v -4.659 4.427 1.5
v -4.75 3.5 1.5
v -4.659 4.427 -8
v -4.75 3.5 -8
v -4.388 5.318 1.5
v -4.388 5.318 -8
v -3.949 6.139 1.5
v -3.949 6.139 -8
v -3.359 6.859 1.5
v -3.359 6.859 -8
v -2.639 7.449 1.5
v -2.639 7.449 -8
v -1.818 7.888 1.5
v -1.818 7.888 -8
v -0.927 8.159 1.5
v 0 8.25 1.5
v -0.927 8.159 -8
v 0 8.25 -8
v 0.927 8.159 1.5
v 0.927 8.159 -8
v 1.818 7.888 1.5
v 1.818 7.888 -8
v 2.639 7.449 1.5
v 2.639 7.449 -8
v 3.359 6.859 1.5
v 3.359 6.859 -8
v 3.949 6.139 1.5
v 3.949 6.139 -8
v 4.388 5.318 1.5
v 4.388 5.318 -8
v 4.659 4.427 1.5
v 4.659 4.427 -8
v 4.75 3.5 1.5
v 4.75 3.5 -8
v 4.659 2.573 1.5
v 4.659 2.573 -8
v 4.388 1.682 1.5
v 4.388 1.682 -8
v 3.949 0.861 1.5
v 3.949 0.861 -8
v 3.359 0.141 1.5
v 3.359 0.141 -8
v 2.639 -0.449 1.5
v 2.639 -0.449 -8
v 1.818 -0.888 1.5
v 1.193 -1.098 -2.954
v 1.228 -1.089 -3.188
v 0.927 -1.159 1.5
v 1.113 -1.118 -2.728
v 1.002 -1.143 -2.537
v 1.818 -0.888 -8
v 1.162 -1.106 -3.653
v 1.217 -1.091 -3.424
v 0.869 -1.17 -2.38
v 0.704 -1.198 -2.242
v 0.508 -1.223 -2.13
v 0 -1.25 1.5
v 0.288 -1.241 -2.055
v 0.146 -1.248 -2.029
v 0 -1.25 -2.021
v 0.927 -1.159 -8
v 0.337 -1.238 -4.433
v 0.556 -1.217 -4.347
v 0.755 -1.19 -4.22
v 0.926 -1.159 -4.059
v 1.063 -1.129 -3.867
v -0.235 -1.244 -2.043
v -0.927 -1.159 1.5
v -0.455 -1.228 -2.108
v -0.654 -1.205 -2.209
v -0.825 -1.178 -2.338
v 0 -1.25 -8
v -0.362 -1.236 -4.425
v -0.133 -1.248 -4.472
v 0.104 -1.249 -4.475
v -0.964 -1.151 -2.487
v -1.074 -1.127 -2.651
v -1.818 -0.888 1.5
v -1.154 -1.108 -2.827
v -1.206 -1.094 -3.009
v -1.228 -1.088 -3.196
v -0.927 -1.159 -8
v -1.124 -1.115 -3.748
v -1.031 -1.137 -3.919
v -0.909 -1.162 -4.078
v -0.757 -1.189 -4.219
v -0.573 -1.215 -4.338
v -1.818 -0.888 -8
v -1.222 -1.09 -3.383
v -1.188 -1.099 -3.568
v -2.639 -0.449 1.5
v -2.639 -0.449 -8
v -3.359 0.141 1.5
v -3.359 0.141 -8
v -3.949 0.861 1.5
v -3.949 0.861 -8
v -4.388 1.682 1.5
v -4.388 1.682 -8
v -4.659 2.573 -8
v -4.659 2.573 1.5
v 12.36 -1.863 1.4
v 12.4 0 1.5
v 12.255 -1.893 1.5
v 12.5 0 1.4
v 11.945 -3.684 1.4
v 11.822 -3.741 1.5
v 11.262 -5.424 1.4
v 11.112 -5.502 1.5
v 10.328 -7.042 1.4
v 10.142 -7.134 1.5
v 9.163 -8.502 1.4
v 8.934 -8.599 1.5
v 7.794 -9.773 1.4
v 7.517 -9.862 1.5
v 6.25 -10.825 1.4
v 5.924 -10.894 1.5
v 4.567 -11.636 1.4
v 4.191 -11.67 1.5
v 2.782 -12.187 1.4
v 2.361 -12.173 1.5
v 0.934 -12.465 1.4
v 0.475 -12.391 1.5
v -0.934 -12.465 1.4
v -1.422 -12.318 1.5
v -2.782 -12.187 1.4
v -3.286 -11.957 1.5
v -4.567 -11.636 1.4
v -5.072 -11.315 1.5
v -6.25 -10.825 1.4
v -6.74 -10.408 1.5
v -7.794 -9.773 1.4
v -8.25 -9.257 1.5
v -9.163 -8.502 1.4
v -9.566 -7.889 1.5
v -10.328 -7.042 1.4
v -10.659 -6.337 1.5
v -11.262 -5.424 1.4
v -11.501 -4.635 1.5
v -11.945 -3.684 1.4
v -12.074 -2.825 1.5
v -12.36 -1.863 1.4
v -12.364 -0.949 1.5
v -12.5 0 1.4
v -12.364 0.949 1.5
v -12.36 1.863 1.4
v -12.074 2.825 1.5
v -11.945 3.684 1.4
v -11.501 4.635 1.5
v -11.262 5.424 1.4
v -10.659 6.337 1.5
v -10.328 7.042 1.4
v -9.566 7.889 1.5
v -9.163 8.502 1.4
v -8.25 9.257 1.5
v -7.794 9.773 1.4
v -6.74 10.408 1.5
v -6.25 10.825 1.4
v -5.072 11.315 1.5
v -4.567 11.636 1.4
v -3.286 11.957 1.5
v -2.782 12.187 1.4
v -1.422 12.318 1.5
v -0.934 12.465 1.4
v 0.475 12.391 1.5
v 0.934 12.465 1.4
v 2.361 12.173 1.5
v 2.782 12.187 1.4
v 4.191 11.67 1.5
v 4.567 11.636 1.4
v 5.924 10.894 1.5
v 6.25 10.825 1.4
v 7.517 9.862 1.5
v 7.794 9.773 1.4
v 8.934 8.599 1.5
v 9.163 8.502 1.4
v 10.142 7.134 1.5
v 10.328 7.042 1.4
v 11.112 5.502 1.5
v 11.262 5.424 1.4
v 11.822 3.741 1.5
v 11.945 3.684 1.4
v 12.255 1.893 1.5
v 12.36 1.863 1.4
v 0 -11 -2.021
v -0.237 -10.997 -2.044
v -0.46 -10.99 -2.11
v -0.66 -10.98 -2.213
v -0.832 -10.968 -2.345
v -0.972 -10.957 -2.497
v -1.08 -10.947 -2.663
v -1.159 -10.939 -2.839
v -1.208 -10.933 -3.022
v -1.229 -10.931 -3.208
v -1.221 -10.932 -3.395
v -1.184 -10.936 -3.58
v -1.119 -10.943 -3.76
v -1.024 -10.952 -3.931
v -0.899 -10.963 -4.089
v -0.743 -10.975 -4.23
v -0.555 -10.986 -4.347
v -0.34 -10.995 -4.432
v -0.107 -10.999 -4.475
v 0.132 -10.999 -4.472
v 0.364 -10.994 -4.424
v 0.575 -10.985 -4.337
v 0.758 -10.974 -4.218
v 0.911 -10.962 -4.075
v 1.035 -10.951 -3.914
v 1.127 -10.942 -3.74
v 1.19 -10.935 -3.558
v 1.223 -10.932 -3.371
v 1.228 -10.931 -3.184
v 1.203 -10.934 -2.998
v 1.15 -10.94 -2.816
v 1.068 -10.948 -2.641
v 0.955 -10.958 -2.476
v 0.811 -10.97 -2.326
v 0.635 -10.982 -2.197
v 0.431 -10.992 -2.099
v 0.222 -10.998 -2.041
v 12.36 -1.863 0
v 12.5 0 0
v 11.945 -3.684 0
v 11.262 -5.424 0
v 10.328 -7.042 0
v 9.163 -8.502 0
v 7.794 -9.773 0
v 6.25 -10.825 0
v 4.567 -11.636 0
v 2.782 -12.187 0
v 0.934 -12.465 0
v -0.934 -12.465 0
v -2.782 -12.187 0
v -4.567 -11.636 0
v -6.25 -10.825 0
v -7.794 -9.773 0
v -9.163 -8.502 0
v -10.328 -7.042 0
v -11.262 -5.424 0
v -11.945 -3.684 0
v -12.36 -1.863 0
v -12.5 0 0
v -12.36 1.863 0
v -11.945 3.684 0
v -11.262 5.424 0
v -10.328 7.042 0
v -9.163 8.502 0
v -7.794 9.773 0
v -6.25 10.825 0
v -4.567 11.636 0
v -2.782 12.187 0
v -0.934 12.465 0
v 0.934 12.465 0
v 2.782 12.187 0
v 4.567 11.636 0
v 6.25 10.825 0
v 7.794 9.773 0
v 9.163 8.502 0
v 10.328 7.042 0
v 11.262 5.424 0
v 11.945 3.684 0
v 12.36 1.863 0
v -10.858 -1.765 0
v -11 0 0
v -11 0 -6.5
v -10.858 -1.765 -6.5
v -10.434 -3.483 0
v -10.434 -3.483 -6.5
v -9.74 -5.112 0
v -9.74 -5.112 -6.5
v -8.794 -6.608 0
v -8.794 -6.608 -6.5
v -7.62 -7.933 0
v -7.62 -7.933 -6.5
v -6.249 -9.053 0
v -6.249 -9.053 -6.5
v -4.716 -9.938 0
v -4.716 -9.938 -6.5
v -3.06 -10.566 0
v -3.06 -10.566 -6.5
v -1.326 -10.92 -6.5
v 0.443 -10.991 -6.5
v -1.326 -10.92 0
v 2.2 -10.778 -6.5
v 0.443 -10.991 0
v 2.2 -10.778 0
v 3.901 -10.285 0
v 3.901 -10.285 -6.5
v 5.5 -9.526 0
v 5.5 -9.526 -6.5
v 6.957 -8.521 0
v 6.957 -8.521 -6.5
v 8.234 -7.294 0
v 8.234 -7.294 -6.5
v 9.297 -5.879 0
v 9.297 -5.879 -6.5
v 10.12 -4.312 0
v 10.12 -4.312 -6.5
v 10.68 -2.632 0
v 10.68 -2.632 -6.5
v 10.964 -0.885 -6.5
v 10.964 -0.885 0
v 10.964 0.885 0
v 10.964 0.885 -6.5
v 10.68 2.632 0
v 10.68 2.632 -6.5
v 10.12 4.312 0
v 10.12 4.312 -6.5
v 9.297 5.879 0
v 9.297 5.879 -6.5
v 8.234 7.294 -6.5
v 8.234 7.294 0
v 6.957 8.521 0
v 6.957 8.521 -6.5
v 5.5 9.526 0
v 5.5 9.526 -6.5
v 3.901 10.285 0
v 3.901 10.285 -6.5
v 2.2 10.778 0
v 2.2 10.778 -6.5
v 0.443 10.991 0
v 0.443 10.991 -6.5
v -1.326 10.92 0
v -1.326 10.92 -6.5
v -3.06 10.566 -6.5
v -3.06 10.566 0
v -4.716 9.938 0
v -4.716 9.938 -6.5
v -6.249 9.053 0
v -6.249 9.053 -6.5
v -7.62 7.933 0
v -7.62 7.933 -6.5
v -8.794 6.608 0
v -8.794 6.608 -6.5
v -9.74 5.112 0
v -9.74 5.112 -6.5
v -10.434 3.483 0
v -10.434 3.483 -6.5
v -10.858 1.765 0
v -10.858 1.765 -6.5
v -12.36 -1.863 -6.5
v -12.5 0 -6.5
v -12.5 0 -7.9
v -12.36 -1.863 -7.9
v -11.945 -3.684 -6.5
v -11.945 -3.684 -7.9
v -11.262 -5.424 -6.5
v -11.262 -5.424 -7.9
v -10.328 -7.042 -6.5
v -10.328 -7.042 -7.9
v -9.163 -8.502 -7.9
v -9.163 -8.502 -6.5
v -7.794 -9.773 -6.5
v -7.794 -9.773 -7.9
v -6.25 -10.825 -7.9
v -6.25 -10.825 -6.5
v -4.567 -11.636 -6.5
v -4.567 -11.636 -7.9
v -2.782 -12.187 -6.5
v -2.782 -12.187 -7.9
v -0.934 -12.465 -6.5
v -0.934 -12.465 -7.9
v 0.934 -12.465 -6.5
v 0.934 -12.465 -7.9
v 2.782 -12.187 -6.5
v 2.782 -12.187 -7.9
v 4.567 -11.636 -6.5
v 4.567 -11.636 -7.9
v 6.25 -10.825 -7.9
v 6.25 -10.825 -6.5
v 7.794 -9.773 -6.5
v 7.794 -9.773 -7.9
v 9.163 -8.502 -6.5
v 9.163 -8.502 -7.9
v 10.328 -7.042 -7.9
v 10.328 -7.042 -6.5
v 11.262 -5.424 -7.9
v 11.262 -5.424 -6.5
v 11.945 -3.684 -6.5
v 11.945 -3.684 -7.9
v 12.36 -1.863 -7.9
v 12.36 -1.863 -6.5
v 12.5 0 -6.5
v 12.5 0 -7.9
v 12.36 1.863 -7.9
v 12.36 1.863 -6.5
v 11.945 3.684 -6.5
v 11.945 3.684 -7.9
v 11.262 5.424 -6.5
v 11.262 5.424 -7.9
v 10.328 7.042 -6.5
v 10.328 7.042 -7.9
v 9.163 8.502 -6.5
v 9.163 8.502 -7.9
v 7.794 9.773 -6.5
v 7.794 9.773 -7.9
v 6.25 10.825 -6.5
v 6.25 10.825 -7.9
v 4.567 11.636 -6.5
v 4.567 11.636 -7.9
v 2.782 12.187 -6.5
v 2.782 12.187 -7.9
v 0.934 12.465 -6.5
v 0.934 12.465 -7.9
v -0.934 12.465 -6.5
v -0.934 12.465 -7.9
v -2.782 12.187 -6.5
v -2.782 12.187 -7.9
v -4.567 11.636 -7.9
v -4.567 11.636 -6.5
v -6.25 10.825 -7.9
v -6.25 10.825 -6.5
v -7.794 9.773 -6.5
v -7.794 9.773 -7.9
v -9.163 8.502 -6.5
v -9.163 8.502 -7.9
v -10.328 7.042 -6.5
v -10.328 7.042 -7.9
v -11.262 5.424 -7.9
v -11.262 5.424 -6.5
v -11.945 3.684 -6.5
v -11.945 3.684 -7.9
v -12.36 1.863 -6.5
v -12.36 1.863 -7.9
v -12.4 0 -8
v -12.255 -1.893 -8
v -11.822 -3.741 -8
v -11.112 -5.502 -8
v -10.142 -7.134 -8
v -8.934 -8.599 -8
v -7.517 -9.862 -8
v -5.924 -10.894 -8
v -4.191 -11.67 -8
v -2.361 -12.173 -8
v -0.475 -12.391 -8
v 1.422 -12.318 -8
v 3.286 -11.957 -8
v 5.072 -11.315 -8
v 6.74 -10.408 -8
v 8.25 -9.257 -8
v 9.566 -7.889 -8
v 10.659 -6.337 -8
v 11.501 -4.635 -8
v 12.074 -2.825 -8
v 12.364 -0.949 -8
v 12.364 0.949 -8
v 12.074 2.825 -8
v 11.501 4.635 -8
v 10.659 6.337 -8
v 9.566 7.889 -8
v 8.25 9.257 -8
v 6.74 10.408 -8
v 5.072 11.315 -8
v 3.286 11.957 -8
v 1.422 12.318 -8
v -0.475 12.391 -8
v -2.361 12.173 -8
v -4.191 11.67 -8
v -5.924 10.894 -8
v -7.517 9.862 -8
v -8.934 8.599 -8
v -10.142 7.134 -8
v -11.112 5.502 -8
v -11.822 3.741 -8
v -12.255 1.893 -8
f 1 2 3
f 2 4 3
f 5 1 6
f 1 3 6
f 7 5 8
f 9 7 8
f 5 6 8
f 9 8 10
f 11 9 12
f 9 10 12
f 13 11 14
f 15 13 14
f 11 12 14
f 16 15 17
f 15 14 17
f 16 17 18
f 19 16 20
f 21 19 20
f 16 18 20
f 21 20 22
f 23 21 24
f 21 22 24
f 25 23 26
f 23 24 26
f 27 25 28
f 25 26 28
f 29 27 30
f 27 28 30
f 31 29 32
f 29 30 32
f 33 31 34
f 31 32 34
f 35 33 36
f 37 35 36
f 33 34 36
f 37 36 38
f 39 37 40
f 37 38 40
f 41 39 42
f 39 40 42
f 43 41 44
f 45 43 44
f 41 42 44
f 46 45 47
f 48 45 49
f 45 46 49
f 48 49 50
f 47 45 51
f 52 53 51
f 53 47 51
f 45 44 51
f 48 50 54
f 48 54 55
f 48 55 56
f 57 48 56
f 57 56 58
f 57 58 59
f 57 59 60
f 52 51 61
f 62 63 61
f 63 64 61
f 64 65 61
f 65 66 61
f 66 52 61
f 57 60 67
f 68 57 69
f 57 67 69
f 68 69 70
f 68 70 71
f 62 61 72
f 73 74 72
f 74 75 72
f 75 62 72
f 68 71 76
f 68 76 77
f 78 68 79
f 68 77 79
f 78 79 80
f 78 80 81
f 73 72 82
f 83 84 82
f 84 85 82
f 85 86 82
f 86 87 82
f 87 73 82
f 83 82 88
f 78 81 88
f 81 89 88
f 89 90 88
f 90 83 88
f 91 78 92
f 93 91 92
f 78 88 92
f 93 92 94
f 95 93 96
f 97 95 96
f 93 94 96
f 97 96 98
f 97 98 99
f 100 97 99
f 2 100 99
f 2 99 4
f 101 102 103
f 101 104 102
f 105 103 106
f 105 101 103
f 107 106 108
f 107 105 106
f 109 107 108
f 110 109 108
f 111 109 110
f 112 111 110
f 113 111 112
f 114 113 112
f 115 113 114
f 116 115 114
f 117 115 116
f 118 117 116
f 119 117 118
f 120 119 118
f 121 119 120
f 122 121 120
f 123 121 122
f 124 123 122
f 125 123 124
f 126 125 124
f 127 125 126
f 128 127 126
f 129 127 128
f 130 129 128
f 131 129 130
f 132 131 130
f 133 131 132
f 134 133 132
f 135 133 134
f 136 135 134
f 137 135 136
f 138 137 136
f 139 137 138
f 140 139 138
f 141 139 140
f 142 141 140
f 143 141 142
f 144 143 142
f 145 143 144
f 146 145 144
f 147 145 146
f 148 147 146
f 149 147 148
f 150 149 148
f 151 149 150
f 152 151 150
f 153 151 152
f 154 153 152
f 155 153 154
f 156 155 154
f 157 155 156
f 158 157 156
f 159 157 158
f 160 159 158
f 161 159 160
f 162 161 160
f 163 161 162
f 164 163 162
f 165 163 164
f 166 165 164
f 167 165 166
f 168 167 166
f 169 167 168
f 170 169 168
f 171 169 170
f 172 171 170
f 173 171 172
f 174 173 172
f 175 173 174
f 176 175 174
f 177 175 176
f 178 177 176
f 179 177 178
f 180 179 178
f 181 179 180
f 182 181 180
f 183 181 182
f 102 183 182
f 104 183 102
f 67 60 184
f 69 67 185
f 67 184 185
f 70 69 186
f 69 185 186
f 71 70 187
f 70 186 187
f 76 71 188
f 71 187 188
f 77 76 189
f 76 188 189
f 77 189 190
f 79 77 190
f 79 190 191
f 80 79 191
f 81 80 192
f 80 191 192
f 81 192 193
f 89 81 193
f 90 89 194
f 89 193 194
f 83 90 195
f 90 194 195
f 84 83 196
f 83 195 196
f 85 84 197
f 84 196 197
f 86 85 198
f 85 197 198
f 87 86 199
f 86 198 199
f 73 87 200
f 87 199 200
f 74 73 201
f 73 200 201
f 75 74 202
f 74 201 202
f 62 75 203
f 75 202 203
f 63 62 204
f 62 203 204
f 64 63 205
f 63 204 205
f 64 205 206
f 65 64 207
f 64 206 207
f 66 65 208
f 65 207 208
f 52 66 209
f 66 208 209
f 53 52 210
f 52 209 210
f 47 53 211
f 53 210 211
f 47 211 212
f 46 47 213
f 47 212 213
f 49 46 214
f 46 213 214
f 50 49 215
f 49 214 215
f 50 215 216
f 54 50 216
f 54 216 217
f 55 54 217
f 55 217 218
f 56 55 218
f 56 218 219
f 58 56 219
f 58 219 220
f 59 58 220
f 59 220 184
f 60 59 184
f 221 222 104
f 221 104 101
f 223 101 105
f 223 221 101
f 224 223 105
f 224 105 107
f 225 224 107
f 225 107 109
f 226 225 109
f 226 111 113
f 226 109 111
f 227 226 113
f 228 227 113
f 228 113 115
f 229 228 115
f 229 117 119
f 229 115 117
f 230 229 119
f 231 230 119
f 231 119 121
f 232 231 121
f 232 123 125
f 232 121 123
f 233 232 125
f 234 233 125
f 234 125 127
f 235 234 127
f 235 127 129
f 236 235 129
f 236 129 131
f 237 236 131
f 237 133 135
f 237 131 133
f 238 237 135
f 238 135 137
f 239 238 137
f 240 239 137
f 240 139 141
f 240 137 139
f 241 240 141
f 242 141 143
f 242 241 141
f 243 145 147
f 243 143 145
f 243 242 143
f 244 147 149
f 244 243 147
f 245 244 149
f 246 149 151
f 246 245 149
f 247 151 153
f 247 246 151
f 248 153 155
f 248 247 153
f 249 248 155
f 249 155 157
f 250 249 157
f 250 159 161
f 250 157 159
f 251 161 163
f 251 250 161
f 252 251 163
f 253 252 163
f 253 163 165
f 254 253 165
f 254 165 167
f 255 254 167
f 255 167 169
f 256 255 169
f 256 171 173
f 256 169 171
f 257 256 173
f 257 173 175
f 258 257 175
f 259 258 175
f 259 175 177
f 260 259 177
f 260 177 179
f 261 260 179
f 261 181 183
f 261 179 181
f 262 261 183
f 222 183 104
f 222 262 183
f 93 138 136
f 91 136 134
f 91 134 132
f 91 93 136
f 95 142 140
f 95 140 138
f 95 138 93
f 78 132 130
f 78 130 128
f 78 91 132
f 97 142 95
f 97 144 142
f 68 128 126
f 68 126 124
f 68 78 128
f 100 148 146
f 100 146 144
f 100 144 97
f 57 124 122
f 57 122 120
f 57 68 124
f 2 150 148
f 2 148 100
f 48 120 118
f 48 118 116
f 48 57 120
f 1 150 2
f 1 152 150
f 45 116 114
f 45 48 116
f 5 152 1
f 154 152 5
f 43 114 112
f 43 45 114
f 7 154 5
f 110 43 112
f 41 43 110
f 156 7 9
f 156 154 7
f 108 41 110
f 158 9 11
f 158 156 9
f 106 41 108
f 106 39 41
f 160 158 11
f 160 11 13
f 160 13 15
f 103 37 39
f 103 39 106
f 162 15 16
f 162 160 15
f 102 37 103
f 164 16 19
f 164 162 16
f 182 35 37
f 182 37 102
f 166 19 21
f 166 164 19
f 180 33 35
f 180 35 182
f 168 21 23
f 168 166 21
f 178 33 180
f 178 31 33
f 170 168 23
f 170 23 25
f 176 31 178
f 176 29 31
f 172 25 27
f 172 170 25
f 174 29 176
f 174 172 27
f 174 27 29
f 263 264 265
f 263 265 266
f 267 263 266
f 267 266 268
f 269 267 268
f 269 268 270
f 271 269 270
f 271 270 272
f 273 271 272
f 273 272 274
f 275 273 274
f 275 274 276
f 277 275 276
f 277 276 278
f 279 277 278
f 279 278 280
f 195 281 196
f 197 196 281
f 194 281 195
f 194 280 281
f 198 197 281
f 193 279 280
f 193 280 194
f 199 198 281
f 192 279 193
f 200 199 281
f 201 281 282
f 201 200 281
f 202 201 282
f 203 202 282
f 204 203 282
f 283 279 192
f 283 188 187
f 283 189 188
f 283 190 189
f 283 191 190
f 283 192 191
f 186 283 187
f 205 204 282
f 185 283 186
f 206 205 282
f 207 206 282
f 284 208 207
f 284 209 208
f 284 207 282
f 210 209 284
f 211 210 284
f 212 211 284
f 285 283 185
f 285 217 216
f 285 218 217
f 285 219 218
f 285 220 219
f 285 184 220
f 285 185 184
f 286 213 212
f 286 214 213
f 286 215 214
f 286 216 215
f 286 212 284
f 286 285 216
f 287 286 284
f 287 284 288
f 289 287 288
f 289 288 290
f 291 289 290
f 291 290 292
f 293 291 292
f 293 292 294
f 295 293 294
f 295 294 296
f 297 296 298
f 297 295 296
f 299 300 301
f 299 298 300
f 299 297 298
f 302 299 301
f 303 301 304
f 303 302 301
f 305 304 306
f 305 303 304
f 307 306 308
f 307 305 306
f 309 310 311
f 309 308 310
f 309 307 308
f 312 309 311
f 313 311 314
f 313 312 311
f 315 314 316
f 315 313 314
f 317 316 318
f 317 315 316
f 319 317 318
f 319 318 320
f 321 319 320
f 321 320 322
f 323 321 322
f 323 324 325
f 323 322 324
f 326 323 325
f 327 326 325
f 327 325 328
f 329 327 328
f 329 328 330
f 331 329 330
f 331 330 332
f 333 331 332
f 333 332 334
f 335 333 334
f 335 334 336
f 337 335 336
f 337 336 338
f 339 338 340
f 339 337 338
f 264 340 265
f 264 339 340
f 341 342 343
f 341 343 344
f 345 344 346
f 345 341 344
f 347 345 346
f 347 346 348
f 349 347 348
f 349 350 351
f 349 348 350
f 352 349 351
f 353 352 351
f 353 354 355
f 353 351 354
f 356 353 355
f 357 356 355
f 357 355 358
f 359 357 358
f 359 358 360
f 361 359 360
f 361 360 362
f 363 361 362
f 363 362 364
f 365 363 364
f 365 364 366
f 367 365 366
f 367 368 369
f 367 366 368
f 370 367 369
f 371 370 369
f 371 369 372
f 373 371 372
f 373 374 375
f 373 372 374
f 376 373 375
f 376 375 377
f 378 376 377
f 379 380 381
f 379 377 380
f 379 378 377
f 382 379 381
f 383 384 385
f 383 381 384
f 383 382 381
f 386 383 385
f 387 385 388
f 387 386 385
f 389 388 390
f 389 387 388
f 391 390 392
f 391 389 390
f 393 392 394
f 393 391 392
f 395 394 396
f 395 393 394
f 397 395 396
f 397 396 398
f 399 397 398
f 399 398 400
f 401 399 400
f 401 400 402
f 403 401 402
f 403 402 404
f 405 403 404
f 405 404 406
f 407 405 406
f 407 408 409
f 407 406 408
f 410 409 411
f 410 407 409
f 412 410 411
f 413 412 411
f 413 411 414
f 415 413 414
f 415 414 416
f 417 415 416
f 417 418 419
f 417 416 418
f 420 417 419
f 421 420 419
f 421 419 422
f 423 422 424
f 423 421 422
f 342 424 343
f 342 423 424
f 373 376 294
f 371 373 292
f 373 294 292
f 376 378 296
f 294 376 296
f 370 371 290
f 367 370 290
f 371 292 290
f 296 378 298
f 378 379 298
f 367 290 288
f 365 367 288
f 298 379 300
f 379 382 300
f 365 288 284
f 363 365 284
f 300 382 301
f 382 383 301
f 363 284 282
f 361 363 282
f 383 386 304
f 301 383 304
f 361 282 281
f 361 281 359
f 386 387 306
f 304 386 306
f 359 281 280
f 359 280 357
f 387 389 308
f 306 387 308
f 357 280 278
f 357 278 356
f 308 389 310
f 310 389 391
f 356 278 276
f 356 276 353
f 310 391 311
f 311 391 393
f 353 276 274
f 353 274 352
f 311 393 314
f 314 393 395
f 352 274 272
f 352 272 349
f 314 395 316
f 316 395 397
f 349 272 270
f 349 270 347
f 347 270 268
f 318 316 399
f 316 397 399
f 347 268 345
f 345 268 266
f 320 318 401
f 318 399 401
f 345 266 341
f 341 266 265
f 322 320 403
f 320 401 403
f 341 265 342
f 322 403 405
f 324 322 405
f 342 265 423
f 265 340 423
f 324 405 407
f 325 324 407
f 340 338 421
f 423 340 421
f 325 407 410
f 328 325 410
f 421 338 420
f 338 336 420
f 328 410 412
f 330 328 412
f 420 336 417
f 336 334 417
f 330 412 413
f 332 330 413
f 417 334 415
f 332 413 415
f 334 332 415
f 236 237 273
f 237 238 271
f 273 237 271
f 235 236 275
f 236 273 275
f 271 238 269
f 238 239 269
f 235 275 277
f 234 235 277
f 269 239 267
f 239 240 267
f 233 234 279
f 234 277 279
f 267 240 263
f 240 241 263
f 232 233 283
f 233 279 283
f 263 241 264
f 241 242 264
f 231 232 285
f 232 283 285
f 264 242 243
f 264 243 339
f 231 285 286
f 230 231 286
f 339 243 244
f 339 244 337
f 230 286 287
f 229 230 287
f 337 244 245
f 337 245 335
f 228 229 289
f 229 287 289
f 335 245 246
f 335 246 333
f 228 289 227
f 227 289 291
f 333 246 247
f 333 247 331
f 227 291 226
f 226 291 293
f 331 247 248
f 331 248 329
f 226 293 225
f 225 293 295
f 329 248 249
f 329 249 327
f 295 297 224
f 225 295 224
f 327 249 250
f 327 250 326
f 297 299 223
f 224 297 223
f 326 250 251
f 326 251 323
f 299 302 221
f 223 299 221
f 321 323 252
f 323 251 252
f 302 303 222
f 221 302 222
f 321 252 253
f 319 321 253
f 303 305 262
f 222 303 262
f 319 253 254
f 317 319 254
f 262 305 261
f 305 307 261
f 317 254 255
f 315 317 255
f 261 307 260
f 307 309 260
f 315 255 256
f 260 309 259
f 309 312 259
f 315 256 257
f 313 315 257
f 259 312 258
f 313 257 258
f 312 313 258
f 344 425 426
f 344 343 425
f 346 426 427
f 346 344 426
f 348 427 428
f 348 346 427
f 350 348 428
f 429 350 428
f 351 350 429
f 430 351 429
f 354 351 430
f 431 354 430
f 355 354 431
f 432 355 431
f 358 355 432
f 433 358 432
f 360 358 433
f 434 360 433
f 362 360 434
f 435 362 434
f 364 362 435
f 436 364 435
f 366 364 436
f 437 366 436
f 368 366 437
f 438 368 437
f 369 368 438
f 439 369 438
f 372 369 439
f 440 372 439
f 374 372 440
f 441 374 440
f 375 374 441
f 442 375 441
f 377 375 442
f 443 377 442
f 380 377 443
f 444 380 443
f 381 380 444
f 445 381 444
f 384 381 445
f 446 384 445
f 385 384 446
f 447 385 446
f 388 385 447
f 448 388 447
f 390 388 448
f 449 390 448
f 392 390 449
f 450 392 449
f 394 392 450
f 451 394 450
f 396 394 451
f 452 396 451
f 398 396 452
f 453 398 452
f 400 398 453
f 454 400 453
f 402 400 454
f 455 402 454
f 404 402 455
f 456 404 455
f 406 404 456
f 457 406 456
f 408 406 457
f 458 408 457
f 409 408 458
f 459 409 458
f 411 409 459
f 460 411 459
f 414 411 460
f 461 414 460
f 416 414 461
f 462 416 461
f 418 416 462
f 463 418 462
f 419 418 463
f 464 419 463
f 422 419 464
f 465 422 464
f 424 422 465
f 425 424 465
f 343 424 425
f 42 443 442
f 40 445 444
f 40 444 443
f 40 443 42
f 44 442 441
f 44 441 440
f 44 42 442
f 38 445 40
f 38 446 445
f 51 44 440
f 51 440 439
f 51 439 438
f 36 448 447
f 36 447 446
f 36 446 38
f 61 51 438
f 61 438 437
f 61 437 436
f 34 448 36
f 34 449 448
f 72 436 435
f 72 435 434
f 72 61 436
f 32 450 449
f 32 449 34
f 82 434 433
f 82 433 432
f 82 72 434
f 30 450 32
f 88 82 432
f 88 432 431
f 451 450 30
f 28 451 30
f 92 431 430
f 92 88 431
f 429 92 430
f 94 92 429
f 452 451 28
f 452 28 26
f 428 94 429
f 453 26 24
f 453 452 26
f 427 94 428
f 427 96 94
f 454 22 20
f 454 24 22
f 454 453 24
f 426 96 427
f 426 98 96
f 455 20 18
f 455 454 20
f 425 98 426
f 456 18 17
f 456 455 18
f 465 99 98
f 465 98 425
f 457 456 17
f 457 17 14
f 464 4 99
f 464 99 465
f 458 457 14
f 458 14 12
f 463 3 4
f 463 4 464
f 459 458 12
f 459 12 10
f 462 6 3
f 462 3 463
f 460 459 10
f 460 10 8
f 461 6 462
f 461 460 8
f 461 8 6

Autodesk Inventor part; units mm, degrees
ref_plane "YZ Plane" through (0, 0, 0) normal (1, 0, 0) x (0, 1, 0)
ref_plane "XZ Plane" through (0, 0, 0) normal (0, 1, 0) x (-1, 0, 0)
ref_plane "XY Plane" through (0, 0, 0) normal (0, 0, 1) x (1, 0, 0)
sketch "Sketch1" plane through (0, 0, 0) normal (0, 0, 1) x (1, 0, 0)
  circle A0 centre (0, 0) radius 12.5
  dimension "d0" = 25
extrude "Extrusion1" add sketch "Sketch1" along normal blind 1.5
sketch "Sketch2" plane through (0, 0, 0) normal (0, 0, -1) x (-1, 0, 0)
  circle A0 centre (0, 0) radius 12.5 projected
  circle A1 centre (0, 0) radius 11
  dimension "d3" = 22
extrude "Extrusion2" add sketch "Sketch2" along normal blind 6.5 contours A1
sketch "Sketch3" plane through (0, 0, -6.5) normal (0, 0, -1) x (-1, 0, 0)
  circle A0 centre (0, 0) radius 11 projected
  circle A1 centre (0, 0) radius 12.5
  dimension "d6" = 25
extrude "Extrusion3" add sketch "Sketch3" along normal blind 1.5 contours A0 | A1
sketch "Sketch4" plane through (0, 0, -8) normal (0, 0, -1) x (-1, 0, 0)
  circle A0 centre (0, 0) radius 12.5 projected
  circle A1 centre (0, 3.5) radius 4.75
  dimension "d9" = 3.5
  dimension "d10" = 9.5
extrude "Extrusion4" cut sketch "Sketch4" against normal through all contours A1
sketch "Sketch6" plane through (0, 0, 0) normal (0, 1, 0) x (-1, 0, 0)
  line L0 (11, 0) -> (11, -6.5) projected
  line L1 (-11, 0) -> (-11, -6.5) projected
  line L2 (-12.5, -6.5) -> (12.5, -6.5) projected
  point P0 (0, 0)
  point P1 (0, -3.25)
  point P2 (11, -3.25)
  dimension "d18" = 11
  dimension "d19" = 3.25
hole "Hole1" at (0, 0, -3.25) direction (0, -1, 0) diameter 2.459 end through all thread size "M3x0.5" class "6H" standard "ANSI Metric M Profile"
chamfer "Chamfer1" distance 0.1 angle 45 2 edges at (12.5, 0, -8) (-12.5, 0, 1.5)
properties part number "28 - Eccentric  Sheav" material "Steel AISI 1020 108 ANLD"
